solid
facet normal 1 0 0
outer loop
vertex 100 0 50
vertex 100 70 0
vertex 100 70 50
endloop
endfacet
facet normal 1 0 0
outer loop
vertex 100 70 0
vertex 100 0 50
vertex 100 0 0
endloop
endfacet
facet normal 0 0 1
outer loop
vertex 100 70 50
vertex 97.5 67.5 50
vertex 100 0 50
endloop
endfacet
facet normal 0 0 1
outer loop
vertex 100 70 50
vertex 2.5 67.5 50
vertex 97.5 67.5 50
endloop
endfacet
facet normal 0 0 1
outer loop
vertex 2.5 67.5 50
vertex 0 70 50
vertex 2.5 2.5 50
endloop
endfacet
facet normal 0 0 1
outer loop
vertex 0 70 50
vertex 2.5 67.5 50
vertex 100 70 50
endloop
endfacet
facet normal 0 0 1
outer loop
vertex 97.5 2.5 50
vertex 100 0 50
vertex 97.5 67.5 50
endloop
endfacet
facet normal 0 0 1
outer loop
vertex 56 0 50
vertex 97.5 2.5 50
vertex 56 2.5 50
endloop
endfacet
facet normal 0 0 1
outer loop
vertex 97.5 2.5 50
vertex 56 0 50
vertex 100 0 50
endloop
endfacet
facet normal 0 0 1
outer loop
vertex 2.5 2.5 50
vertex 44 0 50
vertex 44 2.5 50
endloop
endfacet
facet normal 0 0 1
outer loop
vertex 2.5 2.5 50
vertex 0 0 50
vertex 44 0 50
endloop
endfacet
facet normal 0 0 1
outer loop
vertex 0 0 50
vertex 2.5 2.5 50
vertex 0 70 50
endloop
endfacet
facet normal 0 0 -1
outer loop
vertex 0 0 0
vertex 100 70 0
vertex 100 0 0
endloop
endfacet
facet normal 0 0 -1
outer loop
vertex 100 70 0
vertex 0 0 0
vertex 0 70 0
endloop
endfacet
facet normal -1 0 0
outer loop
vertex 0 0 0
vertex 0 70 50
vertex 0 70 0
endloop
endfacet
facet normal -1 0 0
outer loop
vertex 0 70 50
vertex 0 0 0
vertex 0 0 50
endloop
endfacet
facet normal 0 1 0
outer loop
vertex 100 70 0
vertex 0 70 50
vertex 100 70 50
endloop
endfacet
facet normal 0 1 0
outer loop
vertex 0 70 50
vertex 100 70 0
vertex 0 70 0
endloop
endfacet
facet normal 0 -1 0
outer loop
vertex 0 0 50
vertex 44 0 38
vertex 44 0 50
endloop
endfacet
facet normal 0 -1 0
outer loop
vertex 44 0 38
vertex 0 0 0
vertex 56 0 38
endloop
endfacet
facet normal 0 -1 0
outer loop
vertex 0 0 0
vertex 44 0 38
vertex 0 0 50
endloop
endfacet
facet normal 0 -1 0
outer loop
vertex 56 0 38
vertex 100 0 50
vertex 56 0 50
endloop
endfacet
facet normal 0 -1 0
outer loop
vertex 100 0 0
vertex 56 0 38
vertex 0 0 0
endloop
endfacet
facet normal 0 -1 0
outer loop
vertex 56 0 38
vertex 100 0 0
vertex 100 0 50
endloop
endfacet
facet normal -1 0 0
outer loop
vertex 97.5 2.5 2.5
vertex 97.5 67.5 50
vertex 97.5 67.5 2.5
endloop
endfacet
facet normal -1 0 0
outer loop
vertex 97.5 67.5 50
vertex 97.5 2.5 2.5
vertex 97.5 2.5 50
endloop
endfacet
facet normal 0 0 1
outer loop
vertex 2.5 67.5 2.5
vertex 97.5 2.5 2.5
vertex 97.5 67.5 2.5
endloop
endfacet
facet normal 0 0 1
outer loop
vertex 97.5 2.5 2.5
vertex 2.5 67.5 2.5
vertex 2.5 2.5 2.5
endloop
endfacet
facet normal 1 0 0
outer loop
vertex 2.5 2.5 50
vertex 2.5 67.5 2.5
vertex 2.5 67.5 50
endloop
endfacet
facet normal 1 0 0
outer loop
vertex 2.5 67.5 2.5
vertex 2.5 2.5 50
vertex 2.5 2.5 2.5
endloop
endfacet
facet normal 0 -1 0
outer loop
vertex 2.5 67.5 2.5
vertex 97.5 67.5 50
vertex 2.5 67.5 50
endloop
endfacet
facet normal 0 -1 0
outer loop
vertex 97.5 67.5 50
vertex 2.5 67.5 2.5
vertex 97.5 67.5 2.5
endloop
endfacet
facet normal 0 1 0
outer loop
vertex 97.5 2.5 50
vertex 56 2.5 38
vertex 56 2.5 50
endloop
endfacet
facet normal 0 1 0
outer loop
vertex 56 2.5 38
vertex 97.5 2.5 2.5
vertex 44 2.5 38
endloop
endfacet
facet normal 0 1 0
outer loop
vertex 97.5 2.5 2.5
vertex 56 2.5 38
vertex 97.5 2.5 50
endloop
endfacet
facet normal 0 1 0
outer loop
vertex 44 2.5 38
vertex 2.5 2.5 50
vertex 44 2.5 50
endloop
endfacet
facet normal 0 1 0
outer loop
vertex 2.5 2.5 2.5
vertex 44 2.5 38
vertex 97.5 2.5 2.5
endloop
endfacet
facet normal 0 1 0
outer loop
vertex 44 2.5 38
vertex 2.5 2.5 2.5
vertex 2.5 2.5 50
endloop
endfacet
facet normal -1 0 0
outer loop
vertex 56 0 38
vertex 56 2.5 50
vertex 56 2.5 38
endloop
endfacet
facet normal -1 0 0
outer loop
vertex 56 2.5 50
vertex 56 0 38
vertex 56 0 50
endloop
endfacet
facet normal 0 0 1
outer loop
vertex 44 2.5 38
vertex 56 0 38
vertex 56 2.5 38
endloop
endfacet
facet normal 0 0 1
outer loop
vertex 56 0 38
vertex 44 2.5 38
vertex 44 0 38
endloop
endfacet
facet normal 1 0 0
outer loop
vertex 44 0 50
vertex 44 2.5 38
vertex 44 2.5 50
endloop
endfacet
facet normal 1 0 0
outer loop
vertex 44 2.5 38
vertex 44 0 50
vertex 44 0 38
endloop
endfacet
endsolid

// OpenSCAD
$fn = 32;

// ----------------------------------------------------------------------
// Enclosure box: notch enclosure
// ----------------------------------------------------------------------

// --- parameters (mm) ---
box_l = 100;              // outer length, X
box_w = 70;               // outer width, Y
box_h = 50;               // outer height
wall_t = 2.5;             // wall thickness
notch_w = 12;             // cable notch width
notch_h = 12;             // cable notch height

inner_h = box_h - wall_t;  // cavity depth
boss_h = inner_h - 2;  // corner boss height

difference() {
  union() {
    difference() {
      cube([box_l, box_w, box_h]);
      translate([wall_t, wall_t, wall_t])
        cube([box_l - 2 * wall_t, box_w - 2 * wall_t, box_h]);
    }
  }
  translate([box_l / 2 - notch_w / 2, -1, box_h - notch_h])
    cube([notch_w, wall_t + 2, notch_h + 1]);
}
